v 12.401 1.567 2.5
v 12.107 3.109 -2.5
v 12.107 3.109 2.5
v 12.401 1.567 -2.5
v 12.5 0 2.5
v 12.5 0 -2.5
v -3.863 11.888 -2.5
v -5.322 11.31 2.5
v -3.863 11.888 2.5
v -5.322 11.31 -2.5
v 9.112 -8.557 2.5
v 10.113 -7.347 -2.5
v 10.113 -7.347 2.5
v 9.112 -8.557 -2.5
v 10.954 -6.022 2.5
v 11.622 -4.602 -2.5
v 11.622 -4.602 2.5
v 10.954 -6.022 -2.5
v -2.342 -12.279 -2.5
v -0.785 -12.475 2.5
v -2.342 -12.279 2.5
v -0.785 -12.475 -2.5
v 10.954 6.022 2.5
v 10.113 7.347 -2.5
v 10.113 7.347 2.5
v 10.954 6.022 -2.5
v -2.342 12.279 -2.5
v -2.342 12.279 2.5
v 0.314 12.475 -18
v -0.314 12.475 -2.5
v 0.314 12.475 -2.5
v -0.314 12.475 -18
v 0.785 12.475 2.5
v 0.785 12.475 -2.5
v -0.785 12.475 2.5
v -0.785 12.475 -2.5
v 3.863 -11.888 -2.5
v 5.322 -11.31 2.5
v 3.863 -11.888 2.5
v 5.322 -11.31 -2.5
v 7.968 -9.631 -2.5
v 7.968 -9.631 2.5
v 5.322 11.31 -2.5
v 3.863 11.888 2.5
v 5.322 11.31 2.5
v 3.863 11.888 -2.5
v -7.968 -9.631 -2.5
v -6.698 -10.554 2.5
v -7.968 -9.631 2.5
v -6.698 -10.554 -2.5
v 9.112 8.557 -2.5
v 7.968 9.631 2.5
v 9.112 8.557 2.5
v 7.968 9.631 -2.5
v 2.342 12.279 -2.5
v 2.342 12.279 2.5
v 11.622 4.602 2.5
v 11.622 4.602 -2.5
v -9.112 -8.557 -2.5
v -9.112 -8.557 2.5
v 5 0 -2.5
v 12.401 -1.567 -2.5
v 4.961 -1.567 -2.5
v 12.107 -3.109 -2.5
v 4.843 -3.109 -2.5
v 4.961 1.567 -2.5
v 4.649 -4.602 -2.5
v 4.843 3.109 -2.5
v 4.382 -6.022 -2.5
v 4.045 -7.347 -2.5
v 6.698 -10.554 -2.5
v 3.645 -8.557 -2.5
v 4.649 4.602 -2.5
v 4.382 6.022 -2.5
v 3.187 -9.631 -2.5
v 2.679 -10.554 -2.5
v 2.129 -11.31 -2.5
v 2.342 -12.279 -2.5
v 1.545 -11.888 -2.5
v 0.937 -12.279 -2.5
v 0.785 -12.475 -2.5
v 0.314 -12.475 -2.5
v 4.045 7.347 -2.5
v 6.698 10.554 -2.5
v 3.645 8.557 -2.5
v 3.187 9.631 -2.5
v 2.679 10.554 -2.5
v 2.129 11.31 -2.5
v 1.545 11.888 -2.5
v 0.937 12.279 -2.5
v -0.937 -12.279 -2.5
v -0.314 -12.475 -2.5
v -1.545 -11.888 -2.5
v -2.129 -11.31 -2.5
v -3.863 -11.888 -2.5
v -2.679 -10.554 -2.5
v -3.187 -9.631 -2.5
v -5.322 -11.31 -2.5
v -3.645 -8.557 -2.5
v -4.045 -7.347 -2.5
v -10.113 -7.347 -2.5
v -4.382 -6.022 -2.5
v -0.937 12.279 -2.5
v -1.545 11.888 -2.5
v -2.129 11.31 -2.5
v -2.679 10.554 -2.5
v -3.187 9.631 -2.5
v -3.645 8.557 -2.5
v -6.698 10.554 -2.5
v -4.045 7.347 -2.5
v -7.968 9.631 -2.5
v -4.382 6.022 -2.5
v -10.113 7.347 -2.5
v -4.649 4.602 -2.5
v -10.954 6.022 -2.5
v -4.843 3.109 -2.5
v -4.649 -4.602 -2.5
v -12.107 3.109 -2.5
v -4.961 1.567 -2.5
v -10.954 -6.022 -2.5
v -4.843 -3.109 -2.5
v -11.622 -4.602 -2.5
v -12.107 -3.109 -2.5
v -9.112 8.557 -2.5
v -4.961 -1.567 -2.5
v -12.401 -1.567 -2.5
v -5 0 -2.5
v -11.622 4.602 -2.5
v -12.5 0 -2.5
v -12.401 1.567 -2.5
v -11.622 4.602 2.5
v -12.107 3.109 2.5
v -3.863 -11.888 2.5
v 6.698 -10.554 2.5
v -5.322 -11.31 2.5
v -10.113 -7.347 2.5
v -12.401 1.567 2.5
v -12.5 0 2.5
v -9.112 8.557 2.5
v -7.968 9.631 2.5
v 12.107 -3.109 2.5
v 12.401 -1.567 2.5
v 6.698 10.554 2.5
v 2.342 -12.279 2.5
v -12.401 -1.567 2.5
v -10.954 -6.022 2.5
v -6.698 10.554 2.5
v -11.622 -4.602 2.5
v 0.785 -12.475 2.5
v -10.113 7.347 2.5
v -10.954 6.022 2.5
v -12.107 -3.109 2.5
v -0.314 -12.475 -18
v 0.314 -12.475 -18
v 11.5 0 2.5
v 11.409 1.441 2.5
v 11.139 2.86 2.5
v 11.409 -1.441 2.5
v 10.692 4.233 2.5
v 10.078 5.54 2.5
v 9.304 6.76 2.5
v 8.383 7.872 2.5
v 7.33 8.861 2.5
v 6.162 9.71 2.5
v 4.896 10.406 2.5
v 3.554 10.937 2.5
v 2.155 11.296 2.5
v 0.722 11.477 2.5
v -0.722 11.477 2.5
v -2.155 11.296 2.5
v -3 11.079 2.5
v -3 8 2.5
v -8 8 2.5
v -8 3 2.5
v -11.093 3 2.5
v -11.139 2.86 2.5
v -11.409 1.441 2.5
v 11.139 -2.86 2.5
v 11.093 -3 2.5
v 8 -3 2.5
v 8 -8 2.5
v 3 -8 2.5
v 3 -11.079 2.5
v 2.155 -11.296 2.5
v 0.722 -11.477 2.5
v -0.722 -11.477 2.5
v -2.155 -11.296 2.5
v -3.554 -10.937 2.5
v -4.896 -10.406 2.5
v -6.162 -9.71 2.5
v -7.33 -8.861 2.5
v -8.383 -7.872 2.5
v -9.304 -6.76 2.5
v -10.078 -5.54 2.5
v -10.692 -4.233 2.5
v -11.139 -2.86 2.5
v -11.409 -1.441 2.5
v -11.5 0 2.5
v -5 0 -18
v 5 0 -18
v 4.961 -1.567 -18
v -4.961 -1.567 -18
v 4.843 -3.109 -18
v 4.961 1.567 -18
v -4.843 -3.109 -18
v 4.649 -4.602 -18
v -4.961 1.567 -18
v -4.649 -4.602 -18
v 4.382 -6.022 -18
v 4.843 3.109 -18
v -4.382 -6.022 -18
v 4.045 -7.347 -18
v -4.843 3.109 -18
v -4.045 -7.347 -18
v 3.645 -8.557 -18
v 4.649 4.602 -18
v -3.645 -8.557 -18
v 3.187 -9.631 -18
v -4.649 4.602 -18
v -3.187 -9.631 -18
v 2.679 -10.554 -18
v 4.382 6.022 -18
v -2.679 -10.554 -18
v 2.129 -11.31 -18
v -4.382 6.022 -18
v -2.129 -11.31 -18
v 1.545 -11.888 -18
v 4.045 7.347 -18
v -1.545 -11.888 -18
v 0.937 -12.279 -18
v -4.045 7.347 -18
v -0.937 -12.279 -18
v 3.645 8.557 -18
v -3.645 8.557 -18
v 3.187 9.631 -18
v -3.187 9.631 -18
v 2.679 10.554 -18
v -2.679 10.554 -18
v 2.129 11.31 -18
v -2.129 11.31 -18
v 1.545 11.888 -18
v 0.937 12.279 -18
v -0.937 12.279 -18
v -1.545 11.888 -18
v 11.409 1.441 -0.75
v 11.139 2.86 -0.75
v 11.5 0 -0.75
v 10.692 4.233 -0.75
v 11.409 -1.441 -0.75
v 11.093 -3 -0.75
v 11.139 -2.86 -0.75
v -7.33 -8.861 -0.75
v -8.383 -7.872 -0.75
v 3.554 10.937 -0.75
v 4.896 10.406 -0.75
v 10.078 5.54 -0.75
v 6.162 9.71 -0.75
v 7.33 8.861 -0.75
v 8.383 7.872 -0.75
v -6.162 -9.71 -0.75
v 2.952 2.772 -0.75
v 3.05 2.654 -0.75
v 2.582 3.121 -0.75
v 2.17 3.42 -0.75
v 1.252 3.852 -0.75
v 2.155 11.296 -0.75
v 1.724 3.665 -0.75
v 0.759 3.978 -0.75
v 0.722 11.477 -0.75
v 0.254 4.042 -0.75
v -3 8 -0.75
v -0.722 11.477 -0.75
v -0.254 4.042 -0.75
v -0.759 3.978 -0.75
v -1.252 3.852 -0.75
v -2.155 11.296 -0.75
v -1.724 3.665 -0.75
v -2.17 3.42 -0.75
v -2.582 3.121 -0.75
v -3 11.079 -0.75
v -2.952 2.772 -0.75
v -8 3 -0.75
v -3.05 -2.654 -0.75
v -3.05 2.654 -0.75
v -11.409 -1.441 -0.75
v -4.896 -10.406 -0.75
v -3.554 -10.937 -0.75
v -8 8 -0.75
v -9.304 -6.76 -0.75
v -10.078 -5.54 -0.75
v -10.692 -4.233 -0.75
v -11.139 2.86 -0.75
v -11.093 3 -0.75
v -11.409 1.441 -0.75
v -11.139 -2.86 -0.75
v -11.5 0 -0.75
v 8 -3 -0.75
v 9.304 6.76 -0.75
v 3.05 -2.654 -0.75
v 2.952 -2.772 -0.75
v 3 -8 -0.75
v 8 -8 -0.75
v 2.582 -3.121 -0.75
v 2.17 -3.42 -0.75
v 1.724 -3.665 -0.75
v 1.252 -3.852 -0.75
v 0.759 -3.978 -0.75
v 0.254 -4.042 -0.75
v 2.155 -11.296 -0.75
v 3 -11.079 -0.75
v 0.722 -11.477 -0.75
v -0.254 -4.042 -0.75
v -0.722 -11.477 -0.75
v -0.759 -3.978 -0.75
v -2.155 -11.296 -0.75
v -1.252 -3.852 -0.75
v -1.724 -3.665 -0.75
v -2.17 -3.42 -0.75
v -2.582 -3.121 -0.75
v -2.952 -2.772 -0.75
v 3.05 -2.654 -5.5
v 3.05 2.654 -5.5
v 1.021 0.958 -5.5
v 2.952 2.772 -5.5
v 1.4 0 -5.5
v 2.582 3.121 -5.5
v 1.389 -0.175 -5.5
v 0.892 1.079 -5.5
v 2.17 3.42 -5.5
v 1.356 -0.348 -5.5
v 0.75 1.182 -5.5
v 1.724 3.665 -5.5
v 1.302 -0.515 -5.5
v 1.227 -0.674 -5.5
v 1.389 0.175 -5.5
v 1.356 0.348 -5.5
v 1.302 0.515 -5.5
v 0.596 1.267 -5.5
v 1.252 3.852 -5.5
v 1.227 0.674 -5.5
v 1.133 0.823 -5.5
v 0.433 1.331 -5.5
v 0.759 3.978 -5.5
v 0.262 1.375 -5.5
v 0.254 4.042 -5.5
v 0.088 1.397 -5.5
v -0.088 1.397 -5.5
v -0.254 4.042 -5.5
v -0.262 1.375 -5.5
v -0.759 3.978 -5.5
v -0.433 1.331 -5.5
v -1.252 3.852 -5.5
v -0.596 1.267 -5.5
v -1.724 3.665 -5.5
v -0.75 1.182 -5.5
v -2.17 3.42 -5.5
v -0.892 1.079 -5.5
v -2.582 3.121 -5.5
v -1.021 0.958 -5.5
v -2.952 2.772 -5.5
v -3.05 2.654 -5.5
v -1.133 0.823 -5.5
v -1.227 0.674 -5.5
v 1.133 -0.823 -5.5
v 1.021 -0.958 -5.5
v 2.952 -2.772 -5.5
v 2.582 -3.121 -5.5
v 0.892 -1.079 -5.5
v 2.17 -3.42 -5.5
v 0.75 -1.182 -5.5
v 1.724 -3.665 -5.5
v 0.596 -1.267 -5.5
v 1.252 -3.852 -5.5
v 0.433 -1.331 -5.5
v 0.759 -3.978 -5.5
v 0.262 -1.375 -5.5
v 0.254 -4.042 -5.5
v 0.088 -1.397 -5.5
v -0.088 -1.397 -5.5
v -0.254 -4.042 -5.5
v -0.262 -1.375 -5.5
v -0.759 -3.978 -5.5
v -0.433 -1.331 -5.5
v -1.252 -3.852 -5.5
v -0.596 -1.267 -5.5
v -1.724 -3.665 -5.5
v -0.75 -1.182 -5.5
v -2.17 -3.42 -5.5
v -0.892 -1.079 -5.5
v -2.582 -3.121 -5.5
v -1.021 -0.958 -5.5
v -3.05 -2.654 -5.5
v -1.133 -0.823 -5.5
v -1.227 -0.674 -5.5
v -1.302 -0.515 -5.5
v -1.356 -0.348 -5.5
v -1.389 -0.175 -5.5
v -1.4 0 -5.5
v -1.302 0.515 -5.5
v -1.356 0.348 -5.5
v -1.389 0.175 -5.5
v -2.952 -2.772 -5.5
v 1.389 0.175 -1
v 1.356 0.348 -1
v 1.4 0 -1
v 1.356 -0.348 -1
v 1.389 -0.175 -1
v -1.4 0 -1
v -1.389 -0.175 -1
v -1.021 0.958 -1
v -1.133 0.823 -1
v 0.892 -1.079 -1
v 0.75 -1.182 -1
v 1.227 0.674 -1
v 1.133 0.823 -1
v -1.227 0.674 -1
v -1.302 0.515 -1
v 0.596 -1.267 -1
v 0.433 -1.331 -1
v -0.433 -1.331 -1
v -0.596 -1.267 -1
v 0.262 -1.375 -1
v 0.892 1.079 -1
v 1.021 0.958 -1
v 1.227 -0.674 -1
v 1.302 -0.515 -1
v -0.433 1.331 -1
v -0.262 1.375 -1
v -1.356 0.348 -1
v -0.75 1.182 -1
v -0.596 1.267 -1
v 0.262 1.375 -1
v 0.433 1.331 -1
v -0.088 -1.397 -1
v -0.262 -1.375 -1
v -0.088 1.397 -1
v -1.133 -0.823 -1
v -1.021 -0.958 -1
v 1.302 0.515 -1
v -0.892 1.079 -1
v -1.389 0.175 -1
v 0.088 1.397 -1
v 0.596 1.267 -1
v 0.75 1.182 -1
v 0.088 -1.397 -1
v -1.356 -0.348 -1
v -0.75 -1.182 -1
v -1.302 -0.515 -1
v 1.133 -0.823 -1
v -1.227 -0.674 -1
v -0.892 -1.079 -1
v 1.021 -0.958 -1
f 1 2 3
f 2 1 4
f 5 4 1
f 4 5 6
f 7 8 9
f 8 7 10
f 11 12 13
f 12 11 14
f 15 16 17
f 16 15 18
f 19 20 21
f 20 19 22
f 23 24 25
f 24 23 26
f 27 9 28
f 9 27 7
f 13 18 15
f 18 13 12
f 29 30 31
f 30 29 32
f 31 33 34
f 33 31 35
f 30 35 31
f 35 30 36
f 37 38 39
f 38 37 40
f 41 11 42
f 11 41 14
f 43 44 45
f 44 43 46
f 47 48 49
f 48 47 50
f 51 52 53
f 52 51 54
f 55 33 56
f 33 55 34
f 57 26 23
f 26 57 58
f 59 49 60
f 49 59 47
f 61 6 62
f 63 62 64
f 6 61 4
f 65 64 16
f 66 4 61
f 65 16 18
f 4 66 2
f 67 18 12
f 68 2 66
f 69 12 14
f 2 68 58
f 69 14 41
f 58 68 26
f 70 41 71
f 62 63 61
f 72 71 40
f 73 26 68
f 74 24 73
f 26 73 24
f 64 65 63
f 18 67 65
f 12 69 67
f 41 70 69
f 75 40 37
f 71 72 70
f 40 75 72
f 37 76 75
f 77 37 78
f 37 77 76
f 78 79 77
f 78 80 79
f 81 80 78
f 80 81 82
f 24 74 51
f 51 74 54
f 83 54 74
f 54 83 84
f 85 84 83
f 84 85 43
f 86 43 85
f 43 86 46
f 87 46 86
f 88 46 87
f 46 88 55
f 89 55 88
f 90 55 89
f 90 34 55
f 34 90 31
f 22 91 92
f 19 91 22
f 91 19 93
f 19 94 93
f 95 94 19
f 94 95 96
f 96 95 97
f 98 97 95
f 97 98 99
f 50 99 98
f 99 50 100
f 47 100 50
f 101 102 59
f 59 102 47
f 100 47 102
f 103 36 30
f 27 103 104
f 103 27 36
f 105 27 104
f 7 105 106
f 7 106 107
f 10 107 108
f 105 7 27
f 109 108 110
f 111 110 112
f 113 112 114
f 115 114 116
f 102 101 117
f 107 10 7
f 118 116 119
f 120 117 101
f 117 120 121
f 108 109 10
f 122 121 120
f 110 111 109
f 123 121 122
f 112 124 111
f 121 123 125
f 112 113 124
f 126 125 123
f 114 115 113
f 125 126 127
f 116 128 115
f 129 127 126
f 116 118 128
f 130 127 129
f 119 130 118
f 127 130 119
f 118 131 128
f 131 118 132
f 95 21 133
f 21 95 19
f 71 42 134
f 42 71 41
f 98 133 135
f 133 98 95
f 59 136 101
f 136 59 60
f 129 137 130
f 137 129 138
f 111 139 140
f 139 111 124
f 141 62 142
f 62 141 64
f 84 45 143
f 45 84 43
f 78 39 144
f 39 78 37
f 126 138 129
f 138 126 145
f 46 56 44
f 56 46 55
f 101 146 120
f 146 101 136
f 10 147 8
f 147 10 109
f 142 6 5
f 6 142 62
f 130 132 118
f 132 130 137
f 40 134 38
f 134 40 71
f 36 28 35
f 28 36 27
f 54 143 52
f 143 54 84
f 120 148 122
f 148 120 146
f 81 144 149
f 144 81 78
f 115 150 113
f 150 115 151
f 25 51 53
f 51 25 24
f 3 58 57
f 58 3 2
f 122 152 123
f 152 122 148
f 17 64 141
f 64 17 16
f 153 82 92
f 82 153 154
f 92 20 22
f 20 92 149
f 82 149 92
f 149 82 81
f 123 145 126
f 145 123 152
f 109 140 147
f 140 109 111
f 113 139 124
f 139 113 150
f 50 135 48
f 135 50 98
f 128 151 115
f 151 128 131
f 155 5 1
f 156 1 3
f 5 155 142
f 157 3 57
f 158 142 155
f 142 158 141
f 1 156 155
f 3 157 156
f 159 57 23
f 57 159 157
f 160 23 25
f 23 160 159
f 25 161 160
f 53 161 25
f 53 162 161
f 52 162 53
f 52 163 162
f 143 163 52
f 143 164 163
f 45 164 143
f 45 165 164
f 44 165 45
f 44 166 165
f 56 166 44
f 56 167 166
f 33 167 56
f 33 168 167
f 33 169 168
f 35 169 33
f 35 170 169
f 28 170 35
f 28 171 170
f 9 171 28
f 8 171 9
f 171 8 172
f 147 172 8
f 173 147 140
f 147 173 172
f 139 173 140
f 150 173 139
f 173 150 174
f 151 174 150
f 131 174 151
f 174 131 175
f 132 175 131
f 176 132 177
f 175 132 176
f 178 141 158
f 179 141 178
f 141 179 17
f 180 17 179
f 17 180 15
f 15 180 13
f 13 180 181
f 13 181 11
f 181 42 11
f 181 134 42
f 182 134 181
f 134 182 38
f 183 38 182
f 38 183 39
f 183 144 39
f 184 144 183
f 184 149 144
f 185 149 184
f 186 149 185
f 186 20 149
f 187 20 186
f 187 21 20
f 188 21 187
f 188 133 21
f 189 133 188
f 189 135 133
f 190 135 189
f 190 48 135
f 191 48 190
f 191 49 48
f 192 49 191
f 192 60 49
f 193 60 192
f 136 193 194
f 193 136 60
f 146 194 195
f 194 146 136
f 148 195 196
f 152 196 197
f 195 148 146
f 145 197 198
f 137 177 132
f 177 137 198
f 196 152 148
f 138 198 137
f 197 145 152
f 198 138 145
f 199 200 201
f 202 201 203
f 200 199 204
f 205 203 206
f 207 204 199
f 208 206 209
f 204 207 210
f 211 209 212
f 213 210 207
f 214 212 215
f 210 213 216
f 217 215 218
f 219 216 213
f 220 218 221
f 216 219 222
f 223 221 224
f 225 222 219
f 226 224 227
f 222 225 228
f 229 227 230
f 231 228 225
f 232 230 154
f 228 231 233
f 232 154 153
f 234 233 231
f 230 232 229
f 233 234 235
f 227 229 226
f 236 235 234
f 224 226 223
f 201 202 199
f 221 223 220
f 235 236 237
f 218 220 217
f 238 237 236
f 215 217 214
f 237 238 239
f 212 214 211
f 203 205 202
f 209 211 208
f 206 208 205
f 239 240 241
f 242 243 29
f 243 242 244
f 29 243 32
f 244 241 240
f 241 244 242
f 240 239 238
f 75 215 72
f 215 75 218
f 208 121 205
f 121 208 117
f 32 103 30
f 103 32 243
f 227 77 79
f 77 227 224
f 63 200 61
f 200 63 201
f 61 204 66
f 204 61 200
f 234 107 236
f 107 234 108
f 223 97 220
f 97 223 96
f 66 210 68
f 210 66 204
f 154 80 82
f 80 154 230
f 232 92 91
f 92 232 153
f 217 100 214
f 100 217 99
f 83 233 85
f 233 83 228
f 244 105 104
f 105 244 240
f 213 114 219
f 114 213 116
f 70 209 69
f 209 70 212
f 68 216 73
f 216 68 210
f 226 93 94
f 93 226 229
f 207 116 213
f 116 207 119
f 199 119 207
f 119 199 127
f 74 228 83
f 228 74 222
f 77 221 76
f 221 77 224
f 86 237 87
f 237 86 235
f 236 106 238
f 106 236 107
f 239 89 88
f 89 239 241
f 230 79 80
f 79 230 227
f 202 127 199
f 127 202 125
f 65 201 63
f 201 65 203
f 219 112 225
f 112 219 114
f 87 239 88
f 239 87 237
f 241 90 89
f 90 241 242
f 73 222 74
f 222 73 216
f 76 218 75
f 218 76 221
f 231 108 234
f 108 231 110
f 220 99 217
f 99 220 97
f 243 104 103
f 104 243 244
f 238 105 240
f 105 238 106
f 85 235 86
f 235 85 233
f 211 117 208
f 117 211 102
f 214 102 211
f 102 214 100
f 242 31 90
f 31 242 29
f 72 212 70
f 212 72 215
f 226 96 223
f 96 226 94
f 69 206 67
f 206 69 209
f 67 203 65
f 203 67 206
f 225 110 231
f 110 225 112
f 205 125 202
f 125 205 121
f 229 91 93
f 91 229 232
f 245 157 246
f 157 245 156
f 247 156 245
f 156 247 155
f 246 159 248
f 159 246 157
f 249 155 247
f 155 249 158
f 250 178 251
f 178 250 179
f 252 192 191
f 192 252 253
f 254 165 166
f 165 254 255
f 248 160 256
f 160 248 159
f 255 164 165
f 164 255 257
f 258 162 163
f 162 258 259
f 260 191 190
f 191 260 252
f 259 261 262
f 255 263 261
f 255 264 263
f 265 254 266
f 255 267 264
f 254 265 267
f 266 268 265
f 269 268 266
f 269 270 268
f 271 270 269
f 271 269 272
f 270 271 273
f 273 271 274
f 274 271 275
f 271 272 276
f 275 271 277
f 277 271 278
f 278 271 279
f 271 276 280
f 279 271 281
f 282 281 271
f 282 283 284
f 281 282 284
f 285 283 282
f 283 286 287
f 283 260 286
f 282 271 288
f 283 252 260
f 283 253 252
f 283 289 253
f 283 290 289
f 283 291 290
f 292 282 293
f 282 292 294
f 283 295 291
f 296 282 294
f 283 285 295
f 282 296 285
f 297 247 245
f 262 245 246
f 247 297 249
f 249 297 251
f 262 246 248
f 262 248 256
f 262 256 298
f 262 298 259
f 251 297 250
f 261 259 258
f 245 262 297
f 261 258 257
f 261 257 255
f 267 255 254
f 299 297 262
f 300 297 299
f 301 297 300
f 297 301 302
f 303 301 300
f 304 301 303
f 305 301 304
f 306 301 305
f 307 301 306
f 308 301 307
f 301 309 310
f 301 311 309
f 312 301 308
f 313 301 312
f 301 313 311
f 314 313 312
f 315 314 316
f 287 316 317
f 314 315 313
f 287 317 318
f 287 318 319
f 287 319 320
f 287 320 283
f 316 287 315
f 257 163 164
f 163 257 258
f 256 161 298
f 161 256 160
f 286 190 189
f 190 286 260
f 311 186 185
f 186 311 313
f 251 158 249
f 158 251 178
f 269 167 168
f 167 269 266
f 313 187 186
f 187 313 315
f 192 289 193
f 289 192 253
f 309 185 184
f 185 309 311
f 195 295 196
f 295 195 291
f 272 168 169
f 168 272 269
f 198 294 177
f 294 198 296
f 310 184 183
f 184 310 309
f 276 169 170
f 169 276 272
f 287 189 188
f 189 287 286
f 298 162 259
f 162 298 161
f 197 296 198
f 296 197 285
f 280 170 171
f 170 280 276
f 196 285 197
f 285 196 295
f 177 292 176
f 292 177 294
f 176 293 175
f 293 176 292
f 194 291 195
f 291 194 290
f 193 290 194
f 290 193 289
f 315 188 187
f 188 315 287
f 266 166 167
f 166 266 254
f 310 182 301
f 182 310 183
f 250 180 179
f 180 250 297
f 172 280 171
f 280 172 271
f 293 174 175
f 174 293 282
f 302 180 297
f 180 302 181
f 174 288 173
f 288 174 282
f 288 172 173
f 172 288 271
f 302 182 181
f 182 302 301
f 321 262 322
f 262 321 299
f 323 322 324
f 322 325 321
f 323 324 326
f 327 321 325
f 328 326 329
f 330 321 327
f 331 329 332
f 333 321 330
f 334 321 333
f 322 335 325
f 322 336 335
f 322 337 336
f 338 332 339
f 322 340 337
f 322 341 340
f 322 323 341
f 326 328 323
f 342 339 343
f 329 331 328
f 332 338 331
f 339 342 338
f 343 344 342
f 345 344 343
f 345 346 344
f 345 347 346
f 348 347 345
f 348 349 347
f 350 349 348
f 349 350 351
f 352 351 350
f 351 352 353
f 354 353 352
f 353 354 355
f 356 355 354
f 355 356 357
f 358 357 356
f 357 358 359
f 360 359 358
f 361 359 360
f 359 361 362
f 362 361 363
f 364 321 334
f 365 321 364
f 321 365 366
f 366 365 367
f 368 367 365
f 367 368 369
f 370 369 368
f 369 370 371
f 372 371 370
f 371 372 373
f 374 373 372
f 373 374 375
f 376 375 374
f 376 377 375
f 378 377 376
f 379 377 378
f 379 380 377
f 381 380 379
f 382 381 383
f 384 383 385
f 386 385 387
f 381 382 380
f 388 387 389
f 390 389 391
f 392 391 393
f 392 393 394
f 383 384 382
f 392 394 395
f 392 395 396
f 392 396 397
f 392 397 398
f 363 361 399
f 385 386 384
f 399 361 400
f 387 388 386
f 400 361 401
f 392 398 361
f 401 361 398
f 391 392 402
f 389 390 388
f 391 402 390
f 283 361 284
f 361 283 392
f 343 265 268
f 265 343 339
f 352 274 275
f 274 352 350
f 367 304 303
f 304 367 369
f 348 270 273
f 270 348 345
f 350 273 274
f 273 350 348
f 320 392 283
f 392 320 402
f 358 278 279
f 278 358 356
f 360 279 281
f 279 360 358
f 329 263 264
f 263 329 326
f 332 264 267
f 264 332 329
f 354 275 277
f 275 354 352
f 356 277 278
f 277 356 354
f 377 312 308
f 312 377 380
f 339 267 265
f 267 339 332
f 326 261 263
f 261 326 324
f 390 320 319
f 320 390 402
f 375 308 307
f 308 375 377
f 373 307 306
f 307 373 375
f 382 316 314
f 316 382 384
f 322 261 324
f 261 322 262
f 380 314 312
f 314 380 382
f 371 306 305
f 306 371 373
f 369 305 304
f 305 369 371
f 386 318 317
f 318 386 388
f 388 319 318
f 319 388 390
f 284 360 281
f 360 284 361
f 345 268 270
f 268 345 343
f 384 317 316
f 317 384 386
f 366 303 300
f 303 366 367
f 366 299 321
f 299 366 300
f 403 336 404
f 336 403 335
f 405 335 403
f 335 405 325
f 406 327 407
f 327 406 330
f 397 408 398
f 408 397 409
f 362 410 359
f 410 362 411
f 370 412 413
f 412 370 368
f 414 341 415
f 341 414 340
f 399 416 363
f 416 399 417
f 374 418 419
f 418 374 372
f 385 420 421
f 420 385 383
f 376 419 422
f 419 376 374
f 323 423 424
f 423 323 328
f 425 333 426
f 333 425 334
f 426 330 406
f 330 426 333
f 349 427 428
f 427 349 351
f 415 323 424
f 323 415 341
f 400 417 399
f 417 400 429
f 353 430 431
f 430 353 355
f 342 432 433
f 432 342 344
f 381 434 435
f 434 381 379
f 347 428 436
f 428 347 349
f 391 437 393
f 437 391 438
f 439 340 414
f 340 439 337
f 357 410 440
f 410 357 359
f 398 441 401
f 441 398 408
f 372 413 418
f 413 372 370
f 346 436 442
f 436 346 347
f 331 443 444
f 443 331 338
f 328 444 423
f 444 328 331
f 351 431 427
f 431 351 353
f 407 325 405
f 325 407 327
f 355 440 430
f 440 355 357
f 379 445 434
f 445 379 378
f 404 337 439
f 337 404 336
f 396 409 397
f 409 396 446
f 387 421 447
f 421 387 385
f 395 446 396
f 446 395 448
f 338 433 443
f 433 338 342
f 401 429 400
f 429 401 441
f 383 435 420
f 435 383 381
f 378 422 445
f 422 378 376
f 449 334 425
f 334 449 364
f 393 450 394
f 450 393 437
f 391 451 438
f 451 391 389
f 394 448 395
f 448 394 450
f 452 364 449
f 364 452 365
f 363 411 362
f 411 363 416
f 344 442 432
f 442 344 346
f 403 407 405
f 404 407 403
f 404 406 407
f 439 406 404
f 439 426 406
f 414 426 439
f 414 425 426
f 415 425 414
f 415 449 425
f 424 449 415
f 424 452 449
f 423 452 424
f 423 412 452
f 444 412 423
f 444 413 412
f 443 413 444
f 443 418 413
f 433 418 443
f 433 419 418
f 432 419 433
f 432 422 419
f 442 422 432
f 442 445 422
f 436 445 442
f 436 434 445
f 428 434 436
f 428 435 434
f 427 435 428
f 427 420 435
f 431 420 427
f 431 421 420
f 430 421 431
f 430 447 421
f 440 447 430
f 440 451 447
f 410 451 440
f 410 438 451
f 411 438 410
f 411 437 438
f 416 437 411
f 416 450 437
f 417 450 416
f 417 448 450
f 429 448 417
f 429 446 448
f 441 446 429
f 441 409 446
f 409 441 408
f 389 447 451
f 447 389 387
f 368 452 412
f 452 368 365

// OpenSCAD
$fn=50;


translate([0,0,-3.5]) cylinder(d=2.8,h=5, center=true);
difference(){
    knob();
    translate([0,0,1]) hole2();
    translate([0,0,-3]) hole();
}

module knob(){
    color("RED") cylinder(d=25,h=5, center=true);
    translate([0,0,-9]) scale([0.4,1,1]) cylinder(d=25,h=18, center=true);
}

module hole(){
    intersection() {
        cube([6.1,8.1,5], center=true);
        cylinder(d=8.1,h=5, center=true);
    }
}

module hole2(){
    cube([16,16,3.5], center=true);
    difference(){
        cylinder(d=23,h=3.5, center=true);
        translate([8,-8,0]) cube(10, center=true);
        translate([-8,8,0]) cube(10, center=true);
    }
}
